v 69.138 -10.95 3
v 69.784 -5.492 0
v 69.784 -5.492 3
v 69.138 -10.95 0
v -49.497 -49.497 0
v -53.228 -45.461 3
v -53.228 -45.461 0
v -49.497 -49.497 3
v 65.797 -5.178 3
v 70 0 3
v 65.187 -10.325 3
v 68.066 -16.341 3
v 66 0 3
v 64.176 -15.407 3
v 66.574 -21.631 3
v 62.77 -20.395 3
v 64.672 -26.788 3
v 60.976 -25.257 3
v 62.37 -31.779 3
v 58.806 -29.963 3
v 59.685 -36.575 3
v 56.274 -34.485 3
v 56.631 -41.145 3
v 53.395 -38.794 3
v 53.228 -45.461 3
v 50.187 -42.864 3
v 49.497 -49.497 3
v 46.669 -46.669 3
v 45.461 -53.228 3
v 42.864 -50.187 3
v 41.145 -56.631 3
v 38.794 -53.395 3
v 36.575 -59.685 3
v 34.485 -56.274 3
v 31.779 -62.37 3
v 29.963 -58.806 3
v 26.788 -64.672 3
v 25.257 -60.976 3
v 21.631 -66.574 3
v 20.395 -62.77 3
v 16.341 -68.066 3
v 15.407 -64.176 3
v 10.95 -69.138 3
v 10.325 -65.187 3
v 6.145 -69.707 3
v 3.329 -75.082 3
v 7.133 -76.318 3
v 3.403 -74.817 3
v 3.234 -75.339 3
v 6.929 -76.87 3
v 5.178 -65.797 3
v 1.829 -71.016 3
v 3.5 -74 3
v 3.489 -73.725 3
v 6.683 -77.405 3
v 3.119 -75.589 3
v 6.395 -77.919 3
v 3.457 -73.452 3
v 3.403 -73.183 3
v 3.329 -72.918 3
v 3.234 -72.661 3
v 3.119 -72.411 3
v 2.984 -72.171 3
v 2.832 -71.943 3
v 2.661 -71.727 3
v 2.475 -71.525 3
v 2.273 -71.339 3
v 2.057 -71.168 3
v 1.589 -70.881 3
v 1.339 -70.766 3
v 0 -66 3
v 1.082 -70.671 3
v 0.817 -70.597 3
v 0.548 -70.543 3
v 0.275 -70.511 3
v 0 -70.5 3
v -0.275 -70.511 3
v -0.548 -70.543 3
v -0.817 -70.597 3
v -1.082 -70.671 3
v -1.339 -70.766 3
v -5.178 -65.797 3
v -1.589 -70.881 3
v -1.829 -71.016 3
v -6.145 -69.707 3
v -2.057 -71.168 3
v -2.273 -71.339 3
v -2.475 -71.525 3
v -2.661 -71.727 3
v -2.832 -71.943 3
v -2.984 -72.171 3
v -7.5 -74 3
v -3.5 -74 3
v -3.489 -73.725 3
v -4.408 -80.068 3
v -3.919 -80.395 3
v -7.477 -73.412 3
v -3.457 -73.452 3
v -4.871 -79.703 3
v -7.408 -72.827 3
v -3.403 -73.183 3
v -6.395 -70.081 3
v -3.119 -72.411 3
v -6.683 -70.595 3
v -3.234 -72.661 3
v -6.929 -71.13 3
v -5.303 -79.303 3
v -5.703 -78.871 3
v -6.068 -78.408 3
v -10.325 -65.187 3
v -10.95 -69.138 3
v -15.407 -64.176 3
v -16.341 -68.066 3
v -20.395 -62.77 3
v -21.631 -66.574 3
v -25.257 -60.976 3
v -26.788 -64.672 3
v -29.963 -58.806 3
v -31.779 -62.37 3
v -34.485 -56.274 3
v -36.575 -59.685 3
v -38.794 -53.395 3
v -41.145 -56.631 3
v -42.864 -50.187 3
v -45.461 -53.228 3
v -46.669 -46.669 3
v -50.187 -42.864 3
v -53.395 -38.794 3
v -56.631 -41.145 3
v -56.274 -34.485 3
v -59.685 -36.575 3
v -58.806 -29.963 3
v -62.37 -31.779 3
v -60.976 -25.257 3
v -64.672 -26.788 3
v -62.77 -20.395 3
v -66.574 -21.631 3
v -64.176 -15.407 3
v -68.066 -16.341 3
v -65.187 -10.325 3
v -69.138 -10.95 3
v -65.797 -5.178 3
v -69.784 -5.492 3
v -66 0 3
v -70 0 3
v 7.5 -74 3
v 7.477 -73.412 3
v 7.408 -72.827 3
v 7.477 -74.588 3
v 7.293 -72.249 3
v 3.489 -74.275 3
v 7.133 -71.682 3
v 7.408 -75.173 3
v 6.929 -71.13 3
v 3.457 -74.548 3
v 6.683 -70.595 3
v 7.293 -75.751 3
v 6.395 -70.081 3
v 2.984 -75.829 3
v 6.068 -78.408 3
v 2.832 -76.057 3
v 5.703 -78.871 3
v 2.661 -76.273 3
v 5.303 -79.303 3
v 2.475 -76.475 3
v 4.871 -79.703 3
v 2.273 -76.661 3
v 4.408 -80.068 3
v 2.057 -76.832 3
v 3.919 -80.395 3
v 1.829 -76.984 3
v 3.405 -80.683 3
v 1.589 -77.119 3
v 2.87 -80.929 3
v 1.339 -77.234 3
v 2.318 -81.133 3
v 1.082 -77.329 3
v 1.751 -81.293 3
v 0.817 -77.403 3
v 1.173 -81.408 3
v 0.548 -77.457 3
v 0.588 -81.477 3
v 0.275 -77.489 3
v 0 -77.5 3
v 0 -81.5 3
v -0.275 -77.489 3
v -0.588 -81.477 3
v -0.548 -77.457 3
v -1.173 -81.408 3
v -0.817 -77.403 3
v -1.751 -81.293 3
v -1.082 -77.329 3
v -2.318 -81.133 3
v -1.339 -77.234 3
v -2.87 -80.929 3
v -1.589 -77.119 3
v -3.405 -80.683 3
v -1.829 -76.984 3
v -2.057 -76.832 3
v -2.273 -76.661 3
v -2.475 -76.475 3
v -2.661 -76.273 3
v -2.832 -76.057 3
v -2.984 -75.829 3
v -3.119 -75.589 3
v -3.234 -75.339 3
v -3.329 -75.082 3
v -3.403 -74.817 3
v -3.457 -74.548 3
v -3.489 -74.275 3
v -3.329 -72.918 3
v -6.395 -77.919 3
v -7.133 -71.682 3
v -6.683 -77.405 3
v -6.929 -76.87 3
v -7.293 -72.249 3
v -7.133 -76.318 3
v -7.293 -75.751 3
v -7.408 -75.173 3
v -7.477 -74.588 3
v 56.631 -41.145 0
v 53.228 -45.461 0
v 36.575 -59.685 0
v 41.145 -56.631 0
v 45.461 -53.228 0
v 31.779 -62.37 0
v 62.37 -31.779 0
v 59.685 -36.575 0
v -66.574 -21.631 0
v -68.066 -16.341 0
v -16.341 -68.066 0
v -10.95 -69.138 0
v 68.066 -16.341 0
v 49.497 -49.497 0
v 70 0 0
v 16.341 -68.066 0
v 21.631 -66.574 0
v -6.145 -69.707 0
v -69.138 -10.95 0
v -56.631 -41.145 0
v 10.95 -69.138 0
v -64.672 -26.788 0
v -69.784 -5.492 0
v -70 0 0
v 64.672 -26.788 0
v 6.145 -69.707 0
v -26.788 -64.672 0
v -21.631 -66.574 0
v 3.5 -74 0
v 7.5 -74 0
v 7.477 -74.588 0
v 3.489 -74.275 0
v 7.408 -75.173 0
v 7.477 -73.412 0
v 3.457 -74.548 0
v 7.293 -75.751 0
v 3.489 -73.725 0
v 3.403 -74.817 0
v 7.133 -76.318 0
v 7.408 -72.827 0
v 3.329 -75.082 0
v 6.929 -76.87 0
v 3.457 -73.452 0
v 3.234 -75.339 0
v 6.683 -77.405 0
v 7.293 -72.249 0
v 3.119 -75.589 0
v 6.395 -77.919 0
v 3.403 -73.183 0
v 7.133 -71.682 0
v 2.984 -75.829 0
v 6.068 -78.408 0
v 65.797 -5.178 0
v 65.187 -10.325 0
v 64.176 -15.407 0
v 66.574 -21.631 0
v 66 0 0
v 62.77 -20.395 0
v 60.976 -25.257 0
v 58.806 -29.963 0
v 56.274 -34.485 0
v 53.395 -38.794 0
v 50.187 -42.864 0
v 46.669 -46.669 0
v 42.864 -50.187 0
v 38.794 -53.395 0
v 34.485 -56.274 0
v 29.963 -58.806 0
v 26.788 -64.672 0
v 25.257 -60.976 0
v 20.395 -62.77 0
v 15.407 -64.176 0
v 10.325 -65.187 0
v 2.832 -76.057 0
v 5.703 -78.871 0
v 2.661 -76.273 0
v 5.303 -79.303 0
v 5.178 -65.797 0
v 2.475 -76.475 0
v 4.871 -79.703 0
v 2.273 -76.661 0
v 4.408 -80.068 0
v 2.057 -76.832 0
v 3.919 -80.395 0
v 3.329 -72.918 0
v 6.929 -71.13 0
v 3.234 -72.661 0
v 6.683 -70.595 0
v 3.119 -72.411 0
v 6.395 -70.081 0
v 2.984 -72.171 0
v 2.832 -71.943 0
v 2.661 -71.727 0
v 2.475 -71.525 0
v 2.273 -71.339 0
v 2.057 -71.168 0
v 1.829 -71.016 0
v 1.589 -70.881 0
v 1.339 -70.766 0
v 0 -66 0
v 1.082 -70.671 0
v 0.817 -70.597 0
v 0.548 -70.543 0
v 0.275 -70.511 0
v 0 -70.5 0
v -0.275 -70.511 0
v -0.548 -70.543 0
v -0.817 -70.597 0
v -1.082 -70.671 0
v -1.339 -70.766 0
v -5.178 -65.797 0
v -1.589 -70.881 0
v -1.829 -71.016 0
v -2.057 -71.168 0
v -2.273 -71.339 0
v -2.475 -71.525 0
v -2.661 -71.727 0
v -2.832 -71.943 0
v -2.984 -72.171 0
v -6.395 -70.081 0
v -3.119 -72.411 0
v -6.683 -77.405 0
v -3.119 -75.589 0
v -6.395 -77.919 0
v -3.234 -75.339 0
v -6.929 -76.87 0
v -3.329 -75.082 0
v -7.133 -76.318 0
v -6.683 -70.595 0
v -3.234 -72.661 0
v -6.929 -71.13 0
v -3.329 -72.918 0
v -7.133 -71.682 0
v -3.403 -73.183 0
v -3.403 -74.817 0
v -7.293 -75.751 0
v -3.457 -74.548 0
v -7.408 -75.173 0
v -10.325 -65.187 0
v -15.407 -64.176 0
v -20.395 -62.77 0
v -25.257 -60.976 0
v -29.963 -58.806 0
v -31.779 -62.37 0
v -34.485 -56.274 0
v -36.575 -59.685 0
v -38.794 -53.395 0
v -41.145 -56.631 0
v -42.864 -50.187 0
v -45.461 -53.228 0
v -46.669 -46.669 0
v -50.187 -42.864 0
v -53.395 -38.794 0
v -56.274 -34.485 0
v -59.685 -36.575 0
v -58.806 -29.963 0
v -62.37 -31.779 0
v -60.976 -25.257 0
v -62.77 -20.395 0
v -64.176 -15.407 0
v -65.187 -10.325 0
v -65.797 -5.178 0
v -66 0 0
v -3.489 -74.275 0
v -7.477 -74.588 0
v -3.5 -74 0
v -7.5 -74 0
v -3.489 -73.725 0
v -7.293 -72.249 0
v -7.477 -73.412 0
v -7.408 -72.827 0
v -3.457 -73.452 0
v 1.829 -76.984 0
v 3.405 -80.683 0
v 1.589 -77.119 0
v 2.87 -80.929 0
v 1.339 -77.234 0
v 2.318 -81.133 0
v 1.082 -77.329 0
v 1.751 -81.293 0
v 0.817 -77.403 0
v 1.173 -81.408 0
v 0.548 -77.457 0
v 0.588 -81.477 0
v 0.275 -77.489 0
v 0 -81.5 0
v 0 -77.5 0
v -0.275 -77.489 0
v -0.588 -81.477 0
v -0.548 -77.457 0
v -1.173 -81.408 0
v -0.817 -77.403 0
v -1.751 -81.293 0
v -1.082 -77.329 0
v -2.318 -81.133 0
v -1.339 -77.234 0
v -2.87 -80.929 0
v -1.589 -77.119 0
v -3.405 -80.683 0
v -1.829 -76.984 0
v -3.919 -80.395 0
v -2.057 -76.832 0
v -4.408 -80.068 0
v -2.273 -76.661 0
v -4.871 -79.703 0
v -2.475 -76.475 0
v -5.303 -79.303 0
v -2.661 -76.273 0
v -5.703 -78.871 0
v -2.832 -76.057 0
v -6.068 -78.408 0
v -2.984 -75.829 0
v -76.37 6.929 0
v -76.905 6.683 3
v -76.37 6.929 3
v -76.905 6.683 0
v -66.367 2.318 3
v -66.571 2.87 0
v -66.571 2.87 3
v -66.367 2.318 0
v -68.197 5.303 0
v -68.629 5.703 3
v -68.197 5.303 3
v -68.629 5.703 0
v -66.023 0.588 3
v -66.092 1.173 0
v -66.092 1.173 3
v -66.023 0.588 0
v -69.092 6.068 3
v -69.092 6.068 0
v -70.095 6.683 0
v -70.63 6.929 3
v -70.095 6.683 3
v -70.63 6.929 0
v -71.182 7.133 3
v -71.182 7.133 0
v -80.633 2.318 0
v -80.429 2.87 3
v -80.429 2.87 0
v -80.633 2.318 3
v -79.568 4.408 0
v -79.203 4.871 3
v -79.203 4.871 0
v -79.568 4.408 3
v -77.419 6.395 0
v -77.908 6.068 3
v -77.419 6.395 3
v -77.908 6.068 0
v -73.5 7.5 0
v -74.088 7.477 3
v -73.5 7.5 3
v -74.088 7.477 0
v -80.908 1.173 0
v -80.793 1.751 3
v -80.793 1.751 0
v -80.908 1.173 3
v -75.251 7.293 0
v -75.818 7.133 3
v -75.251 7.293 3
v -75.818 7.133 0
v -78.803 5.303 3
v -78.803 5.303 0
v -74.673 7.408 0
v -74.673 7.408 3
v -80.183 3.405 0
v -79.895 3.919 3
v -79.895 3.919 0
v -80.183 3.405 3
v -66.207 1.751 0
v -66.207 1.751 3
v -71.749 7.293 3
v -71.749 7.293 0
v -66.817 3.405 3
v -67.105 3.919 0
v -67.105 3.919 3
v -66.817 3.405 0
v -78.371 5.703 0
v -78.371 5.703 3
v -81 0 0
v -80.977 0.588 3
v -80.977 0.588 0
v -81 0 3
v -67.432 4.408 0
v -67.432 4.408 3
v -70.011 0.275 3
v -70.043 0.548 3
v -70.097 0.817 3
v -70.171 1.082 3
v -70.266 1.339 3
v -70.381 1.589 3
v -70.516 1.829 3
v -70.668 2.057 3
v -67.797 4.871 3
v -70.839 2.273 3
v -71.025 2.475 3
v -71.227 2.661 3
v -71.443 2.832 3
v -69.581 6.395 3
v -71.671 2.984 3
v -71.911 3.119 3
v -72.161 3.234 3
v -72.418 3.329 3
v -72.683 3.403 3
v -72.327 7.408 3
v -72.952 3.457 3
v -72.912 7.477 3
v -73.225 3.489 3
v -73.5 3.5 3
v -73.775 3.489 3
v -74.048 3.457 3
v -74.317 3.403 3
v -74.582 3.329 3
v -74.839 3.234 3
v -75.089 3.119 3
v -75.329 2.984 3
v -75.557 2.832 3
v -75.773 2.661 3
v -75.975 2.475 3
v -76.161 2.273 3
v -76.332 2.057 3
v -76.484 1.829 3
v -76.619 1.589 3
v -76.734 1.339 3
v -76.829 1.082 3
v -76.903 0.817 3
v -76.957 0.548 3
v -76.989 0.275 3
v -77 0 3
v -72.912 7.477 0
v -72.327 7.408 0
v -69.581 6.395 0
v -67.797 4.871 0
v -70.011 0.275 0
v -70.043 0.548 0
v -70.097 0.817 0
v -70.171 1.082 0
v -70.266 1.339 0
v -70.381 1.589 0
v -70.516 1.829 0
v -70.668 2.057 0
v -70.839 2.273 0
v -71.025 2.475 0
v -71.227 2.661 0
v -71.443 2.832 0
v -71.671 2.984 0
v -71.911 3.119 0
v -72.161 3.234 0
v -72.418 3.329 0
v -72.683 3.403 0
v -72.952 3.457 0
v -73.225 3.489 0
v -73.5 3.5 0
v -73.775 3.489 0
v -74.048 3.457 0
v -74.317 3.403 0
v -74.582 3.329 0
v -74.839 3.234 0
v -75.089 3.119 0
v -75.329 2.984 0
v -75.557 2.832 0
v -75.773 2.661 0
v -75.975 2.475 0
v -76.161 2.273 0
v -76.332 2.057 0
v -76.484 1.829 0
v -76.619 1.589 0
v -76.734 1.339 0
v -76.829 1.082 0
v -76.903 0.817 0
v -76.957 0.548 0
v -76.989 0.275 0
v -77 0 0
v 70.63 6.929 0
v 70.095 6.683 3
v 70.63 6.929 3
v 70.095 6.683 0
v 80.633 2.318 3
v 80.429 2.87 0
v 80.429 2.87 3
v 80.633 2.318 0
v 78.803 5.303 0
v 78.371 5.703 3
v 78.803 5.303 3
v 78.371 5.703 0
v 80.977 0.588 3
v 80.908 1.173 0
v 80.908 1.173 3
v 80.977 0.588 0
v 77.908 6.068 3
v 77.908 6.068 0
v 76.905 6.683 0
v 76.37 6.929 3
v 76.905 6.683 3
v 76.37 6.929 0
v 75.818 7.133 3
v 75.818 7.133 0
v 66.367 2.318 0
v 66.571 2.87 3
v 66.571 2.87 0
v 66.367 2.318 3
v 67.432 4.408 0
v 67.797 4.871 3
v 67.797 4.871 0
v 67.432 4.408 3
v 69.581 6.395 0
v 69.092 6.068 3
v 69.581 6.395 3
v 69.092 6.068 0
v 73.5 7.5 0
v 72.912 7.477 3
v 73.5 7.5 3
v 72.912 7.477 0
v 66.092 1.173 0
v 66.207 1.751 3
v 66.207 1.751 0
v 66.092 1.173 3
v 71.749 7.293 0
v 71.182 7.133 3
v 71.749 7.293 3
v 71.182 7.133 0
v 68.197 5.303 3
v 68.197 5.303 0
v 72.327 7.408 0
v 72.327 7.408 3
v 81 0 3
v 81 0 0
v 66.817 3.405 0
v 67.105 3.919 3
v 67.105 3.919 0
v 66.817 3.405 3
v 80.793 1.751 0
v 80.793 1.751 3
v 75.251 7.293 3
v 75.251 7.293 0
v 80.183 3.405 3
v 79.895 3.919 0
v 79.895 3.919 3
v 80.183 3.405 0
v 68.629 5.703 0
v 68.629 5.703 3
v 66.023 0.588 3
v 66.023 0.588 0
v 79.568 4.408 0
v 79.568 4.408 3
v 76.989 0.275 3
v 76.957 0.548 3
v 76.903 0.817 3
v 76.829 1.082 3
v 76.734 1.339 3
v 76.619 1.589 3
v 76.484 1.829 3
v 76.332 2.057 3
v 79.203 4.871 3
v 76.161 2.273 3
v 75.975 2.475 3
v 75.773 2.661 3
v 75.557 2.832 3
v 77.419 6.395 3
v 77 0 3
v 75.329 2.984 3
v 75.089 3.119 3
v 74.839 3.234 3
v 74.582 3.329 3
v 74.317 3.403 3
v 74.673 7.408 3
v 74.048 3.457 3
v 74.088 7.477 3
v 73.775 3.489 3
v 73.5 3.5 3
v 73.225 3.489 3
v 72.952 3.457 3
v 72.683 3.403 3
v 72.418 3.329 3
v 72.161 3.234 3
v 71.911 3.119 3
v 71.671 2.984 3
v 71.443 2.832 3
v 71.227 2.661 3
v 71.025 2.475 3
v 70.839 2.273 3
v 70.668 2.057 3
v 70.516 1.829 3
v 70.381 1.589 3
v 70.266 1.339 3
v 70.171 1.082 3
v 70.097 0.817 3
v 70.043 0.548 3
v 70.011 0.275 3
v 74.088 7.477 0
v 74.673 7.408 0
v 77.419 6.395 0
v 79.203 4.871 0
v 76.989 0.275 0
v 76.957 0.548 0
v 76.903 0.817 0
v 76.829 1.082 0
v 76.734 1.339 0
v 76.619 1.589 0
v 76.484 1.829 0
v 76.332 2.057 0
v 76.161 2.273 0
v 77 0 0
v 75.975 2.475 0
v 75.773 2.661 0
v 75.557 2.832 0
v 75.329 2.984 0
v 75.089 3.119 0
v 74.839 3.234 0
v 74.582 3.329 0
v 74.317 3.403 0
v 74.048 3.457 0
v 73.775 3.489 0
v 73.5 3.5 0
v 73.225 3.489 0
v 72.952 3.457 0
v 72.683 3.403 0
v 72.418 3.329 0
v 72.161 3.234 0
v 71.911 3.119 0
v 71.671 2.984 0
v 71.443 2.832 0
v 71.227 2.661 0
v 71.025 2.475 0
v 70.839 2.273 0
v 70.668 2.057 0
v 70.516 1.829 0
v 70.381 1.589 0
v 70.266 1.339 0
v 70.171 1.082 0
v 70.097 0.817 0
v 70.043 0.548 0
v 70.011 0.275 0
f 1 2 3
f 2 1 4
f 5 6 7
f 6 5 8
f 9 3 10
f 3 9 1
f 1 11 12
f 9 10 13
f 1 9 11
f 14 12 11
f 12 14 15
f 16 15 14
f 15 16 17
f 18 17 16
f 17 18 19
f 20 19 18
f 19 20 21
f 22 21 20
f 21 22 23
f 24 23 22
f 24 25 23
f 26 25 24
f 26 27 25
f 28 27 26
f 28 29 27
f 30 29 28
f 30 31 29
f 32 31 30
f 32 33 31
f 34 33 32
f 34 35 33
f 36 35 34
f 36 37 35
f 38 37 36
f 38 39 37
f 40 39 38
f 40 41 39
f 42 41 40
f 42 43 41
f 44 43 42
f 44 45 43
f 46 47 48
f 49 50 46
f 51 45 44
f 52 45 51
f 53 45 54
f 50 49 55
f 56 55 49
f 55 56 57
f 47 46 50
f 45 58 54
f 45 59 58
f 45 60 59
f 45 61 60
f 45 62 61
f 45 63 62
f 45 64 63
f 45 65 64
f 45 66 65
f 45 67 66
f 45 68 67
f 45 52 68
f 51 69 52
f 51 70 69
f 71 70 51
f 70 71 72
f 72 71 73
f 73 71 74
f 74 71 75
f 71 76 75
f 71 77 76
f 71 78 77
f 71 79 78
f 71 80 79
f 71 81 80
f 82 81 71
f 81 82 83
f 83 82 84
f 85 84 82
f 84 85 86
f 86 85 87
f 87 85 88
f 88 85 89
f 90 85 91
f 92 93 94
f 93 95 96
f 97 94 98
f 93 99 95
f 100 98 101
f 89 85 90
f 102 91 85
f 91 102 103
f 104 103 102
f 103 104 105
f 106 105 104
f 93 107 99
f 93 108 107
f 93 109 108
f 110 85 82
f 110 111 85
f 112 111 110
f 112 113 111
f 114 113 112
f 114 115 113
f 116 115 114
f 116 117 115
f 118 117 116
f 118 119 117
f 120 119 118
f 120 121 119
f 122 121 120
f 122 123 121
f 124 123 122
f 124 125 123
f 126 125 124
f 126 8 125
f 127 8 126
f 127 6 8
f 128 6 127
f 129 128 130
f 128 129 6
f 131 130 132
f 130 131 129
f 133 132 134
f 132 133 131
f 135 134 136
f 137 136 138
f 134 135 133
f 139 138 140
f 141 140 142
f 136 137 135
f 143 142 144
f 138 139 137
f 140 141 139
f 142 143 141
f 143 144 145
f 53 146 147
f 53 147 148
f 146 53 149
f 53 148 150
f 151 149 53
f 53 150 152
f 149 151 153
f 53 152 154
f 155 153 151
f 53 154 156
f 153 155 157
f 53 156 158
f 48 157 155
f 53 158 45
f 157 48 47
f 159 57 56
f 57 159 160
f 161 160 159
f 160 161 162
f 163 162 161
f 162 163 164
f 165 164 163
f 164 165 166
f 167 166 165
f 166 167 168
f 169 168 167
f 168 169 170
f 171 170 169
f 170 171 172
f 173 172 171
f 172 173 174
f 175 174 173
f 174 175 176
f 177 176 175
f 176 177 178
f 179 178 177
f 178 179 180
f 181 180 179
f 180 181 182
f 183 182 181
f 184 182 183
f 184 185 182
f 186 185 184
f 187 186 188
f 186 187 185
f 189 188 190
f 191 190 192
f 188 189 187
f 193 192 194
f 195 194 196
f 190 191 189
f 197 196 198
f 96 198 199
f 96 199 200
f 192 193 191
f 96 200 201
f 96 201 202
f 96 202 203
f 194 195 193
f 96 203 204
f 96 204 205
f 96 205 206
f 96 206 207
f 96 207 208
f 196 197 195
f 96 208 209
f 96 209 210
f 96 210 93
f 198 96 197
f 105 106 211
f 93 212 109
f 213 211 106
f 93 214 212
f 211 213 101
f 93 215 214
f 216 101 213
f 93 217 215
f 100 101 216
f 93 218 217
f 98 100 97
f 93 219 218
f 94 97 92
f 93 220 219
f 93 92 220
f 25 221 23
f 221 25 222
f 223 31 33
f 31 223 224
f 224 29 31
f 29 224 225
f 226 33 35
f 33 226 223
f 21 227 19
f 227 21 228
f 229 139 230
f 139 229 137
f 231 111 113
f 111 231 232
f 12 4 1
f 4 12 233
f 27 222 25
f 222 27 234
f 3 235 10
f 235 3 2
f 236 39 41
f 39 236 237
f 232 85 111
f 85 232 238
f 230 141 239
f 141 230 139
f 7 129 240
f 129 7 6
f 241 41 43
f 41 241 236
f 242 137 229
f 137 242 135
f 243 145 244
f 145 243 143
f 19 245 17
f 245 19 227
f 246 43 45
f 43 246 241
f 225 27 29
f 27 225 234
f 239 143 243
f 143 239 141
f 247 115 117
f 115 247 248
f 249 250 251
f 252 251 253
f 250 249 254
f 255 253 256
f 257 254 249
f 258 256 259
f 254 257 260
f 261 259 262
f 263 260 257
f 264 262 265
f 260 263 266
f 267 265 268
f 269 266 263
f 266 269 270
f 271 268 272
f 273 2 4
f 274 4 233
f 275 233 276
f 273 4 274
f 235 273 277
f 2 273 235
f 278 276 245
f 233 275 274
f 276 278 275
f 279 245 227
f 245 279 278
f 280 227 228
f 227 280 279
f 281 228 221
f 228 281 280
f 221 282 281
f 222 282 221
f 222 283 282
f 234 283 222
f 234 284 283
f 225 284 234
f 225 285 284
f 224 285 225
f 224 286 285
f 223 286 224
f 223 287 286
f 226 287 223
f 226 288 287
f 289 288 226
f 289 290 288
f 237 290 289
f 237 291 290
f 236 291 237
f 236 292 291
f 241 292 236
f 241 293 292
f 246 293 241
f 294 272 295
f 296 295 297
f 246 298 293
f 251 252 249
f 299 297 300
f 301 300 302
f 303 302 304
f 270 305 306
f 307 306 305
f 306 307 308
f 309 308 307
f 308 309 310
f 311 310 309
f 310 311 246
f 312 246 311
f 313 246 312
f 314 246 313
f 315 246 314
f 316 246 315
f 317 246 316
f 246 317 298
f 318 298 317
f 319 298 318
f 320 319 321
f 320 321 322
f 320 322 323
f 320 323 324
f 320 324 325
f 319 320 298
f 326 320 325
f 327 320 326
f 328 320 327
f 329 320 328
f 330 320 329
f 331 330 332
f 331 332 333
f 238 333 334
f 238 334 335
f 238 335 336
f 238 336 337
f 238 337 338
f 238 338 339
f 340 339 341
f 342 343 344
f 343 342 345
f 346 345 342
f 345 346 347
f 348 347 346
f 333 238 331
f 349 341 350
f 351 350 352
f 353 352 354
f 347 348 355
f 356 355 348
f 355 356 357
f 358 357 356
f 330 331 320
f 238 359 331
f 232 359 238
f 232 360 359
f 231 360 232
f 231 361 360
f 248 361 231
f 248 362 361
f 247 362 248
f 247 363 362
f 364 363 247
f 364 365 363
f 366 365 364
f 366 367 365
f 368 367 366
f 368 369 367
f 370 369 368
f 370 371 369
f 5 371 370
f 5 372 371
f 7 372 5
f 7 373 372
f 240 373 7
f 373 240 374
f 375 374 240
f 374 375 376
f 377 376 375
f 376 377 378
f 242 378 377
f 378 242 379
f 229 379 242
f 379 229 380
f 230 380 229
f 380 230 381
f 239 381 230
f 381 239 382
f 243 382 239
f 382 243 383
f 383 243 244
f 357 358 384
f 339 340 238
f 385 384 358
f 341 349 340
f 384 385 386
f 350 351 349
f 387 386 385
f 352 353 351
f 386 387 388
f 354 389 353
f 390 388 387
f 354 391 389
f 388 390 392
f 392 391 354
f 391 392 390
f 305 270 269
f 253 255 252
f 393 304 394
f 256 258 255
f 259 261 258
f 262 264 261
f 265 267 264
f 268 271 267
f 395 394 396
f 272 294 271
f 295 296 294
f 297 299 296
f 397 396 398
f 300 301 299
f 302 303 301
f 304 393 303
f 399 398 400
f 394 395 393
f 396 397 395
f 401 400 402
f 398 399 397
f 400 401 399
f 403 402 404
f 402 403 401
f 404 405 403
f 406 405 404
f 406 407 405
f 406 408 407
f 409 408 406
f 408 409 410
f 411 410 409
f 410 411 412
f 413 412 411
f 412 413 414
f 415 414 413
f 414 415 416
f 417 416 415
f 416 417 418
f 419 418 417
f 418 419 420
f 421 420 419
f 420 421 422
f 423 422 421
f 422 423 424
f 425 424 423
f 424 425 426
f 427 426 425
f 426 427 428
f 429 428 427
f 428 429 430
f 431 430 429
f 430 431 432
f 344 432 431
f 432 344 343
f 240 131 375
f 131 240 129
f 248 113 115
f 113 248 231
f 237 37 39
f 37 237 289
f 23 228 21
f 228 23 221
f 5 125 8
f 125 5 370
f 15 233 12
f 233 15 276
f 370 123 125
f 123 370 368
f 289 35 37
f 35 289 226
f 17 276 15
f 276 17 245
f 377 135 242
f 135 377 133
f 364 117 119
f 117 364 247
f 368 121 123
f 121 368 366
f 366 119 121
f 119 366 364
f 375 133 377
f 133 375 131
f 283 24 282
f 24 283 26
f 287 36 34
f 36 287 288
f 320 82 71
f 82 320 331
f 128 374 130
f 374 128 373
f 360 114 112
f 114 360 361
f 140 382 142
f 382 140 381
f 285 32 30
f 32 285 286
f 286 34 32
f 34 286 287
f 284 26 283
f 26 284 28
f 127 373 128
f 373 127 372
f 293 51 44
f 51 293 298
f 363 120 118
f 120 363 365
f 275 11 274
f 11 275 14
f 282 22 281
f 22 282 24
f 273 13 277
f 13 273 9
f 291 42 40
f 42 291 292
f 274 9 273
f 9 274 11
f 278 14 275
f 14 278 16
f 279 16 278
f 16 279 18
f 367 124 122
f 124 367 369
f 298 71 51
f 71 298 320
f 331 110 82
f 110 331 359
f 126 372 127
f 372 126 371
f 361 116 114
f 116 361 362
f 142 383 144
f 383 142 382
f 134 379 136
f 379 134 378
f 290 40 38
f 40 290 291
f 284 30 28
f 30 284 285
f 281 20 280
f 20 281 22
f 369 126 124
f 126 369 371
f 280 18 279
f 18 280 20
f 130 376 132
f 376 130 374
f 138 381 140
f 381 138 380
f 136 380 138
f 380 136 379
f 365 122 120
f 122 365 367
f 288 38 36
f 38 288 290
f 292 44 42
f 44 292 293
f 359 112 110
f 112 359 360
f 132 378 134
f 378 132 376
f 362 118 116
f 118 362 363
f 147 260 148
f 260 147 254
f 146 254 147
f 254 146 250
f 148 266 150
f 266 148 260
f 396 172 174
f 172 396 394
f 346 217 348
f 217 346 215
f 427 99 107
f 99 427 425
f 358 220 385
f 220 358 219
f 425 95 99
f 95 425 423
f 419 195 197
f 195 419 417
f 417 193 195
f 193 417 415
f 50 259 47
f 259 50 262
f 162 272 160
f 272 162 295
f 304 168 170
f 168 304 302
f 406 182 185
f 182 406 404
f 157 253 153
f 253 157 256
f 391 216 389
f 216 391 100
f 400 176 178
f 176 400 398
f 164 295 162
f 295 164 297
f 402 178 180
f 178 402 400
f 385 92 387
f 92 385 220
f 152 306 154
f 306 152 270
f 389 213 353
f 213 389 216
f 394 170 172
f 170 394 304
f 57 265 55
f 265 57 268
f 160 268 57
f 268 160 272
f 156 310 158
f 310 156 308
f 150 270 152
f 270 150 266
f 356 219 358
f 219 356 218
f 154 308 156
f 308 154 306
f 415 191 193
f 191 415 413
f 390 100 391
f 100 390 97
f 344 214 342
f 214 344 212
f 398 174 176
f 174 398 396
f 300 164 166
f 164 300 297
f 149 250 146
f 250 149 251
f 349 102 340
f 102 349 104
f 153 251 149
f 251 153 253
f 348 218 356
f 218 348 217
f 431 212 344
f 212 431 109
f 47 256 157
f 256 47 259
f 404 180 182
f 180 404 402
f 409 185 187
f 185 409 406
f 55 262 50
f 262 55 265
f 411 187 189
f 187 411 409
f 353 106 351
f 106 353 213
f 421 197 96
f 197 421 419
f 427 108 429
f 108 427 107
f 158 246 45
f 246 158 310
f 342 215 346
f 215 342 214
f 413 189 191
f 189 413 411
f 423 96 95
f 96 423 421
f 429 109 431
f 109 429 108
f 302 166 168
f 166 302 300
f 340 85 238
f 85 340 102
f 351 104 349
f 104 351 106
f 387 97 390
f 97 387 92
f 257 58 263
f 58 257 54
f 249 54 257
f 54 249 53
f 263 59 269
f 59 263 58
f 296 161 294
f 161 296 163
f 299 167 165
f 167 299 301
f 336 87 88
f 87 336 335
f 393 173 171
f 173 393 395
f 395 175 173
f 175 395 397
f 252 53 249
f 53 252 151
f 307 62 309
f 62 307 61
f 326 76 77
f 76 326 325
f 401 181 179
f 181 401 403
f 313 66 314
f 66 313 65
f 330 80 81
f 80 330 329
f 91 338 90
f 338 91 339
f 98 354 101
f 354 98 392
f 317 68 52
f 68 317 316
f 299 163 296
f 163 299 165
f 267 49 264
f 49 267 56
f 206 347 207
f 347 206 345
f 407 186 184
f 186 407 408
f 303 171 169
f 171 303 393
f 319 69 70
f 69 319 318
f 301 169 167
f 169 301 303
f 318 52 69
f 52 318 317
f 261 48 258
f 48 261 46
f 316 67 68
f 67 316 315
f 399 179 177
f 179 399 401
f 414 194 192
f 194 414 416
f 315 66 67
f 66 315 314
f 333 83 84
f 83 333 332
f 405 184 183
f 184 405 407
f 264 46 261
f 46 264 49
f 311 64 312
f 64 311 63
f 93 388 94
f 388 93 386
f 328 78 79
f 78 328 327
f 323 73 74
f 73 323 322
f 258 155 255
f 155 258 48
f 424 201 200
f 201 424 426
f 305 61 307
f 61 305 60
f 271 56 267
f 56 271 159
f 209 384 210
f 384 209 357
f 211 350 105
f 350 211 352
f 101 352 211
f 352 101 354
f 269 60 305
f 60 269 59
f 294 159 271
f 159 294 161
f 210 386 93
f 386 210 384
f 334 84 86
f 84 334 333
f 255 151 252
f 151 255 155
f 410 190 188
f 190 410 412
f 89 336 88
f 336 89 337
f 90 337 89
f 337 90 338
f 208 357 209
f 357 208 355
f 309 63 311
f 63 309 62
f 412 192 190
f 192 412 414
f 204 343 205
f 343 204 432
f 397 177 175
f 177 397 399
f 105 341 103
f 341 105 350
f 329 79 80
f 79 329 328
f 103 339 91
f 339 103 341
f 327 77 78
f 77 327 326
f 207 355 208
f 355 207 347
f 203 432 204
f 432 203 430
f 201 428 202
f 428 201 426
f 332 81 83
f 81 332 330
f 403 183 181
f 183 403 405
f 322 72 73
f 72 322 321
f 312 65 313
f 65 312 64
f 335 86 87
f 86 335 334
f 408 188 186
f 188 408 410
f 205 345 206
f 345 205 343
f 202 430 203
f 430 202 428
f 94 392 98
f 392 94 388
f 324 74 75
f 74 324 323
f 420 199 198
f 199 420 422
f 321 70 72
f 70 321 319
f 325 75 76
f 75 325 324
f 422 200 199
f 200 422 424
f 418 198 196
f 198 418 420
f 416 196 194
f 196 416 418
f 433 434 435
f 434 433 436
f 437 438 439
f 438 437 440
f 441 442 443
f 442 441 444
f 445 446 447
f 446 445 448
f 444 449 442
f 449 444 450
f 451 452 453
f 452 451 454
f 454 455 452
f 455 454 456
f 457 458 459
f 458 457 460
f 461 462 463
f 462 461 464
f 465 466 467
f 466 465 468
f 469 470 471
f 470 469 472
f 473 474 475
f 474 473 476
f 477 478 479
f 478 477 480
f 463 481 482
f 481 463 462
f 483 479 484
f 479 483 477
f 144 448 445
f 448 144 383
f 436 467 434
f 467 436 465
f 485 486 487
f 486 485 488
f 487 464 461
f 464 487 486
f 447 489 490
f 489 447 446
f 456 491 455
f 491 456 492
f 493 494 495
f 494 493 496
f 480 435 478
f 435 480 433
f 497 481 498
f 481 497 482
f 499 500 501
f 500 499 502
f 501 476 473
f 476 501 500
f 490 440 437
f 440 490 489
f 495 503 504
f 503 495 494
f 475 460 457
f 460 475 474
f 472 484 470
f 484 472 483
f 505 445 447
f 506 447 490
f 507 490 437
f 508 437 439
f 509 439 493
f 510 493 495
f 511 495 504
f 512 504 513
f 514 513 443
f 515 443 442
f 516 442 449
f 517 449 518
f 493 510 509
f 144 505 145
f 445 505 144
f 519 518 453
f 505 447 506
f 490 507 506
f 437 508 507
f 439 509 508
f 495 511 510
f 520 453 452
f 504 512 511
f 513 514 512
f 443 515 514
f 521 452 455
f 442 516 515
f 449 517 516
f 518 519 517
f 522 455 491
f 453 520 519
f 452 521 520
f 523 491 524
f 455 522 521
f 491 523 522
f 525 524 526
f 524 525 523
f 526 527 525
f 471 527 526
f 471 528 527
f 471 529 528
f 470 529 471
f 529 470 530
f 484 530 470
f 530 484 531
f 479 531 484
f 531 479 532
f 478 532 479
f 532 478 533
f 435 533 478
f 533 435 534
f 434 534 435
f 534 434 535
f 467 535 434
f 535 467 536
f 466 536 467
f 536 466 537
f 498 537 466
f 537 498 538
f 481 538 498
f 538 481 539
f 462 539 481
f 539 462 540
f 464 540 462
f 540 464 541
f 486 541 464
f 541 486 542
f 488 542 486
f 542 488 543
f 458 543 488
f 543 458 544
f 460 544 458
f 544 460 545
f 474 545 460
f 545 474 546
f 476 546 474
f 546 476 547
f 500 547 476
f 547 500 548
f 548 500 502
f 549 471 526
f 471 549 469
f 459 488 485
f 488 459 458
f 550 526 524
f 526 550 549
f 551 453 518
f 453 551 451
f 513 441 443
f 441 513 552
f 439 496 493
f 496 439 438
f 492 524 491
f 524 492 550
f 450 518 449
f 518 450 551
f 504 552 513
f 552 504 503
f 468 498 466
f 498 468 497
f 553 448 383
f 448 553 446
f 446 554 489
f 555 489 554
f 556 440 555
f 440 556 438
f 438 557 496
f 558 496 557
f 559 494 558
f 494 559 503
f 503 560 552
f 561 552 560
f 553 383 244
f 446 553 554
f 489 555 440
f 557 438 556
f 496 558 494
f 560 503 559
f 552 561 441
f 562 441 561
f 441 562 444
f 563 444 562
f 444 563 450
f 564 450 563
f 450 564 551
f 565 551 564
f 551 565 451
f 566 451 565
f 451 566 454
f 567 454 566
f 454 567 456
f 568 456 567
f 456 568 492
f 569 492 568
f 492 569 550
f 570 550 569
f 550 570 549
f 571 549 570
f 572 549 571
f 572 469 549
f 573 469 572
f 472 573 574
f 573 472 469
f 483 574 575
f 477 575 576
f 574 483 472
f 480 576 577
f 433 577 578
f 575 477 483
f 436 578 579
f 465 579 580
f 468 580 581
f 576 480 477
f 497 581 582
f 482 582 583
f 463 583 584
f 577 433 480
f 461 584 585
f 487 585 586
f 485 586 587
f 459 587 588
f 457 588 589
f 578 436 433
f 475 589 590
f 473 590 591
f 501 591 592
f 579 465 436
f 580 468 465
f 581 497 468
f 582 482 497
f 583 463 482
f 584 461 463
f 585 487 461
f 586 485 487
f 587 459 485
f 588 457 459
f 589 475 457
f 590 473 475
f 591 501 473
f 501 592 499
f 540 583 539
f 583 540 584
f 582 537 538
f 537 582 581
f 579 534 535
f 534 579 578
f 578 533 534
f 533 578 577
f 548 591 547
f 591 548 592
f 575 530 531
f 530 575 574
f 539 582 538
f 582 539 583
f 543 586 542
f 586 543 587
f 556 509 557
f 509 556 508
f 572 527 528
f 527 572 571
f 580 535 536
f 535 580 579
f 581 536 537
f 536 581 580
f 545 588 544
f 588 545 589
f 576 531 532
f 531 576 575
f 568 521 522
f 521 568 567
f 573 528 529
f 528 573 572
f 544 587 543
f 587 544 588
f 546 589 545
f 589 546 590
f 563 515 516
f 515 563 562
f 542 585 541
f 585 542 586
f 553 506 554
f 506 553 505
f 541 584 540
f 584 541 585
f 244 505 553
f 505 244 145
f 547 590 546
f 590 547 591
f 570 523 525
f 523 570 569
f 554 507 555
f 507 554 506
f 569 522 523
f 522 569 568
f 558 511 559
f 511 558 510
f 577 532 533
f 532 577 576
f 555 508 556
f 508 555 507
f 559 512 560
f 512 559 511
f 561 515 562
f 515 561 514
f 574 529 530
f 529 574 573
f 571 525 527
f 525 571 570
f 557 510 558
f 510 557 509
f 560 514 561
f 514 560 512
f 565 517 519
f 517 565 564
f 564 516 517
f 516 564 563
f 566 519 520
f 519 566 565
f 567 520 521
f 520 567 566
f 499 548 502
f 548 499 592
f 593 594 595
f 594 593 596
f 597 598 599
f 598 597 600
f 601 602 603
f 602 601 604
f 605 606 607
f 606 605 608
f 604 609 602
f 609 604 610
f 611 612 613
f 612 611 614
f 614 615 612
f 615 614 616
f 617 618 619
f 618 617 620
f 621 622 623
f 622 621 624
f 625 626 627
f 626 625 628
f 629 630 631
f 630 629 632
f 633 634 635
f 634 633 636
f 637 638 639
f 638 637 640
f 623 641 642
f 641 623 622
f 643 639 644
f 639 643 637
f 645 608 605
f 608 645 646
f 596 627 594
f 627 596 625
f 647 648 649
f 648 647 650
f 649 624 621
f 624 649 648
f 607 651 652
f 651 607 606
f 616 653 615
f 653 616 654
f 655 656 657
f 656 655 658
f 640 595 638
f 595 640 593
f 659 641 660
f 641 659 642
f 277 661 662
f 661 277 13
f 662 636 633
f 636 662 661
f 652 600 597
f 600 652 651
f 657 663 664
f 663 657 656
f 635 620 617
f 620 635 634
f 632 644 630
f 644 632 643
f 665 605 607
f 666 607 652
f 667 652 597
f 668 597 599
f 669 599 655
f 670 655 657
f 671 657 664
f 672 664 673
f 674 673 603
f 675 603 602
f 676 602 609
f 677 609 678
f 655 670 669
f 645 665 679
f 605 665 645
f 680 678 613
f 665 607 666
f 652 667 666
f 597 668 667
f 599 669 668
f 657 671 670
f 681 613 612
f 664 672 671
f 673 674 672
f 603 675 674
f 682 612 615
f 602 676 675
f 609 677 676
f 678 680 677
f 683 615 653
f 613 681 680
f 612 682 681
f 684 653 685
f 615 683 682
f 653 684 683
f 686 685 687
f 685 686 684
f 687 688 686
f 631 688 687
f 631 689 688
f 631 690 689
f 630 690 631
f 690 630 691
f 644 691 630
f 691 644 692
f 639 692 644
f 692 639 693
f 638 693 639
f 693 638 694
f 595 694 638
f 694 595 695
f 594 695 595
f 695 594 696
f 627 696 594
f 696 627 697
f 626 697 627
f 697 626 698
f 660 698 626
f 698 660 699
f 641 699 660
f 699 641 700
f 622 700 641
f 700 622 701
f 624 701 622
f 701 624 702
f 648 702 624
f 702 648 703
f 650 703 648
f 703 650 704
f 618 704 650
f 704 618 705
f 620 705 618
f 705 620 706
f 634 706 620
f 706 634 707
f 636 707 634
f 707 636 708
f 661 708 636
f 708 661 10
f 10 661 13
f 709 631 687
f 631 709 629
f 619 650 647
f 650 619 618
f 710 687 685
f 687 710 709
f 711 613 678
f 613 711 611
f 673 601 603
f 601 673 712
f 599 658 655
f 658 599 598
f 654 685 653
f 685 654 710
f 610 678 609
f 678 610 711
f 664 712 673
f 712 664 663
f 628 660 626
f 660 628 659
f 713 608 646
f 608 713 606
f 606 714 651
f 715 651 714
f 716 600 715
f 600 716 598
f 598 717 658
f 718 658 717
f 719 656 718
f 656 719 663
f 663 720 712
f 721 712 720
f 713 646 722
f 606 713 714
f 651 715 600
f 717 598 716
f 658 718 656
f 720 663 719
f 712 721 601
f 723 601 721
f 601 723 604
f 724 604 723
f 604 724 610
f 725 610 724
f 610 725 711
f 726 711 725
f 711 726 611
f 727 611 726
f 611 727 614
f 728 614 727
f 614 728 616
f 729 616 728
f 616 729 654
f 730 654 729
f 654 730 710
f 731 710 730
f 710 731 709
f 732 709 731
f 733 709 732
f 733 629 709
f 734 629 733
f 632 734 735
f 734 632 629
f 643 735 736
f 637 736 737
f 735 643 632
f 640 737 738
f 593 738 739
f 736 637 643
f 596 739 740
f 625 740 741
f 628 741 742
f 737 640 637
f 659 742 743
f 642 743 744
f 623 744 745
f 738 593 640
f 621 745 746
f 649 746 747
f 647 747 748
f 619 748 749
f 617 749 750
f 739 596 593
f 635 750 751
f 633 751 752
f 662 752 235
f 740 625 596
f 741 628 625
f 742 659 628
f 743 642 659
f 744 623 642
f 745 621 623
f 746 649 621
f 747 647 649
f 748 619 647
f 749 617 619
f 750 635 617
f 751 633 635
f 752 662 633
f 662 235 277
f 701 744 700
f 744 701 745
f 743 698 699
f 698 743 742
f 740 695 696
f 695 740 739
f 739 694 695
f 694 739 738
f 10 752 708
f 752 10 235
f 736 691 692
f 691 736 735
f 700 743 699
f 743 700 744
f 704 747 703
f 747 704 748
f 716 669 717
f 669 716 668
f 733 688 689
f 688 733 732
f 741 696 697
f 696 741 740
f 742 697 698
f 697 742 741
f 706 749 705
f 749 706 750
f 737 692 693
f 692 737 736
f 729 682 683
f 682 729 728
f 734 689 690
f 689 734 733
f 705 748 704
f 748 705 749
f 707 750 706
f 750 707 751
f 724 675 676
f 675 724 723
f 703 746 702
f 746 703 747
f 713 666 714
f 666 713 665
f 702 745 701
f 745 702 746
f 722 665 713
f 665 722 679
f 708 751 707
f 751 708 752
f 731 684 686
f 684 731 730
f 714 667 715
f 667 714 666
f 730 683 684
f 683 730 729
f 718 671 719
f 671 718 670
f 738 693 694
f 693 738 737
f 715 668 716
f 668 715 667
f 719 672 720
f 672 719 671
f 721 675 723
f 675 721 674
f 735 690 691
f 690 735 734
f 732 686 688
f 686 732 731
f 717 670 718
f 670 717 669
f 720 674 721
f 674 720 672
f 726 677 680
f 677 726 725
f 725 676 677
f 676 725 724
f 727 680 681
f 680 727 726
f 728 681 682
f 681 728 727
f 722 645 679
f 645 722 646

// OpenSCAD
// Tool to remove filter bucket from jacuzzi
// Made by Torkel Borjeson 2018-10-07
// E-mail torkelb+thingiverse@gmail.com

diameter = 140.0;
width = 4.0;
height = 3.0;
$fn=80;

module hollowCylinder(diam, wid) {
    difference() {
        cylinder(height, d=diam, true);
        translate([0,0, -height])
            cylinder(height*3, d=(diam-2*wid), true);
    }
}

module arc(diam, wid) {
    difference() {
        hollowCylinder(diam, width);        
        translate([0, diam/2, 0])
            cube([diam,diam, height*4], true); 
    }
}

hookDiameter = 15;

module hook(pos) {
    translate([-pos, 0, 0])
    rotate([0, 0, 180])        
    arc(hookDiameter, width);
}
union() {
    arc(diameter, width);
    translate([0, -diameter/2-width, 0]) 
        hollowCylinder(hookDiameter, width);
    hook(diameter/2+width-0.5);
    hook(-(diameter/2+width-0.5));
}
